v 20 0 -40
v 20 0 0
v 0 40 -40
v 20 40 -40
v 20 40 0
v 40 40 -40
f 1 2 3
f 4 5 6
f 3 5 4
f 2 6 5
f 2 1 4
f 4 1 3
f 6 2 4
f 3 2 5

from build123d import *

# Parameters (mm, degrees)
SKETCH1_W           = 40
SKETCH1_H           = 40
BOSS_EXTRUDE1_DEPTH = 40
CUT_EXTRUDE1_DEPTH  = 20
CUT_EXTRUDE2_DEPTH  = 60
CUT_EXTRUDE3_DEPTH  = 60


with BuildPart() as part:
    # Sketch1 → Boss-Extrude1 (new body)
    with BuildSketch(Plane(origin=(0, 0, 0), x_dir=(0, 0, -1), z_dir=(1, 0, 0))):
        with Locations((20, 20)):
            Rectangle(SKETCH1_W, SKETCH1_H)
    extrude(amount=BOSS_EXTRUDE1_DEPTH)

    # Sketch2 → Cut-Extrude1 (cut)
    with BuildSketch(Plane(origin=(40, 0, 0), x_dir=(0, 0, -1), z_dir=(1, 0, 0))):
        Polygon((0, 0), (40, 40), (40, 0), align=None)
    extrude(amount=-CUT_EXTRUDE1_DEPTH, mode=Mode.SUBTRACT)

    # Sketch3 → Cut-Extrude2 (cut)
    with BuildSketch(Plane.XY):
        Polygon((0, 0), (20, 0), (0, 40), align=None)
        Polygon((40, 40), (20, 0), (40, 0), align=None)
    extrude(amount=-CUT_EXTRUDE2_DEPTH, mode=Mode.SUBTRACT)

    # Sketch4 → Cut-Extrude3 (cut)
    with BuildSketch(Plane(origin=(0, 0, 0), x_dir=(1, 0, 0), z_dir=(0, 1, 0))):
        Polygon((0, 0), (20, 0), (0, 40), align=None)
        Polygon((40, 40), (20, 0), (40, 0), align=None)
    extrude(amount=CUT_EXTRUDE3_DEPTH, mode=Mode.SUBTRACT)


solid = part.part
